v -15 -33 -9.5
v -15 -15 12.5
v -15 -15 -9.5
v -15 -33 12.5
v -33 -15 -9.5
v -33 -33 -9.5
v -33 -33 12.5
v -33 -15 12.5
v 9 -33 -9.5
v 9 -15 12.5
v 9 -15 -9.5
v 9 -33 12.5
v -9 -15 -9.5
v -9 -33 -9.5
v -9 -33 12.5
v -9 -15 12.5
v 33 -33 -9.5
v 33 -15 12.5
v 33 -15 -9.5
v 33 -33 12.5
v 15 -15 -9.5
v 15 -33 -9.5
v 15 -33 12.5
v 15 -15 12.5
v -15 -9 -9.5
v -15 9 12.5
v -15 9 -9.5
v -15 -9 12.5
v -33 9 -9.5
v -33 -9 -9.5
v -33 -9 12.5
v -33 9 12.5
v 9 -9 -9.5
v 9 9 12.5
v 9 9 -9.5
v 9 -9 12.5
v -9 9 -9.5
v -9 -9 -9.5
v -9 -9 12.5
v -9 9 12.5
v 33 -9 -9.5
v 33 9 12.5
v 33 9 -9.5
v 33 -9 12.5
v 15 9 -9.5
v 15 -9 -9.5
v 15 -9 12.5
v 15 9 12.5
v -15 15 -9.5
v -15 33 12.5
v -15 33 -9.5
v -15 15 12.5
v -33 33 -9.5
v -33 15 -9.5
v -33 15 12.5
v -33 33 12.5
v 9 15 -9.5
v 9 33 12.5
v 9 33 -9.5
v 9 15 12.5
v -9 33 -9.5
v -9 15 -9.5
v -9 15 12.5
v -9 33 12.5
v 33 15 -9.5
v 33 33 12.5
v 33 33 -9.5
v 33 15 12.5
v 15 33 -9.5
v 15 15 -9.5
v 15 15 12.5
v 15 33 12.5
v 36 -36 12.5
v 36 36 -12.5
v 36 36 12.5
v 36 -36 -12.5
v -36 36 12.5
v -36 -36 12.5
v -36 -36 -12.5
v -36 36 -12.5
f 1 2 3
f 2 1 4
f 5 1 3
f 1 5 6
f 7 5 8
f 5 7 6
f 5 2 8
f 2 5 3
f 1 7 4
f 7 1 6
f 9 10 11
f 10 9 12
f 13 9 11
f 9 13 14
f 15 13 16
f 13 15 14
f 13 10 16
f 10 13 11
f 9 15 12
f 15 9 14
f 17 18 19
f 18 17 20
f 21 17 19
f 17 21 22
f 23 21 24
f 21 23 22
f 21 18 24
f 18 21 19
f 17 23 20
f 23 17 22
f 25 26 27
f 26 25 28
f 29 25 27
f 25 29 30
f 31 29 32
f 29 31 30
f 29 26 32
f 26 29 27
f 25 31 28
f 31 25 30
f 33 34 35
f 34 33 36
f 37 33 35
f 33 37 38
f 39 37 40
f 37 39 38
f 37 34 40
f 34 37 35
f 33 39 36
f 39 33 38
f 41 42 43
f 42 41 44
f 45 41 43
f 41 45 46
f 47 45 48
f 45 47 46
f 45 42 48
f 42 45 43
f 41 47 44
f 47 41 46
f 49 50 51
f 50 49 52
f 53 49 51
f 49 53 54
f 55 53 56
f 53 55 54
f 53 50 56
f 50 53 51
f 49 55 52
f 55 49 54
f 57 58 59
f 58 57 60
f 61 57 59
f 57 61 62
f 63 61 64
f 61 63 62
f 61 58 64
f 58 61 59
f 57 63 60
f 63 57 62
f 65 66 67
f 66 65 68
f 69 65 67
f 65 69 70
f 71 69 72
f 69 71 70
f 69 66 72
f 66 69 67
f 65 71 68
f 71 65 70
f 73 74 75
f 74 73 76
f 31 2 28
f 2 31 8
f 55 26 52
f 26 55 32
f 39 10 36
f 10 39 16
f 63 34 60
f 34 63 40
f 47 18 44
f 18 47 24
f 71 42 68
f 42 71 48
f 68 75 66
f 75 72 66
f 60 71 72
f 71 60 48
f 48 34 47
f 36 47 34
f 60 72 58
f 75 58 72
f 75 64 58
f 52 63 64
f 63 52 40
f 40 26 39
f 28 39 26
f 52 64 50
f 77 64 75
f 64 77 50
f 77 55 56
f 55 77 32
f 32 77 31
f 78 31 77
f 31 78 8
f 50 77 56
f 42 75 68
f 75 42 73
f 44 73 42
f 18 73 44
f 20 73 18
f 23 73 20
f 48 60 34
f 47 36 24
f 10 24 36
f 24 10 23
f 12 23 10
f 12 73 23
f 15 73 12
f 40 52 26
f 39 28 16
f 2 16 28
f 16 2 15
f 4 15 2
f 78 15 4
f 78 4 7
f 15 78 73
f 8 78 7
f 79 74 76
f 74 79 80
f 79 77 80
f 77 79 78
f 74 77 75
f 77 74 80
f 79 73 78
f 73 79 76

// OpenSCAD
$fn = 32;

// ----------------------------------------------------------------------
// Pocket plate 72 x 72 x 25
// 3 x 3 pockets 18 mm square, 22 mm deep
// ----------------------------------------------------------------------

// --- parameters (mm) ---
thickness = 25;  // plate thickness
floor_t = 3;     // material left under each pocket
pocket = 18;     // pocket side length
pitch_x = 24;    // pocket pitch along X
pitch_y = 24;    // pocket pitch along Y
cols = 3;        // pockets per row
rows = 3;        // rows of pockets

// --- derived feature positions (mm) ---
depth = thickness - floor_t;        // = 22   pocket depth, down to the floor
span_x = (cols - 1) * pitch_x;      // = 48   distance between outer pockets
span_y = (rows - 1) * pitch_y;      // = 48   distance between outer pocket rows
origin_x = -span_x / 2;             // = -24   X of the first pocket
origin_y = -span_y / 2;             // = -24   Y of the first pocket
plate = [span_x + pocket + 6, span_y + pocket + 6, thickness];  // = [72, 72, 25]   overall size: pockets plus 3 mm of wall on each side
feature_centers = [
  [origin_x + 0 * pitch_x, origin_y + 0 * pitch_y],
  [origin_x + 1 * pitch_x, origin_y + 0 * pitch_y],
  [origin_x + 2 * pitch_x, origin_y + 0 * pitch_y],
  [origin_x + 0 * pitch_x, origin_y + 1 * pitch_y],
  [origin_x + 1 * pitch_x, origin_y + 1 * pitch_y],
  [origin_x + 2 * pitch_x, origin_y + 1 * pitch_y],
  [origin_x + 0 * pitch_x, origin_y + 2 * pitch_y],
  [origin_x + 1 * pitch_x, origin_y + 2 * pitch_y],
  [origin_x + 2 * pitch_x, origin_y + 2 * pitch_y]
];   // pocket centres, used verbatim by the cutter loop

// plate outline, then one pocket per centre in feature_centers
difference() {
  cube(plate, center = true);
  for (centre = feature_centers)
    translate([centre[0] - pocket / 2, centre[1] - pocket / 2, plate[2] / 2 - depth])
      cube([pocket, pocket, depth + 1]);  // centred on the declared pocket centre
}
